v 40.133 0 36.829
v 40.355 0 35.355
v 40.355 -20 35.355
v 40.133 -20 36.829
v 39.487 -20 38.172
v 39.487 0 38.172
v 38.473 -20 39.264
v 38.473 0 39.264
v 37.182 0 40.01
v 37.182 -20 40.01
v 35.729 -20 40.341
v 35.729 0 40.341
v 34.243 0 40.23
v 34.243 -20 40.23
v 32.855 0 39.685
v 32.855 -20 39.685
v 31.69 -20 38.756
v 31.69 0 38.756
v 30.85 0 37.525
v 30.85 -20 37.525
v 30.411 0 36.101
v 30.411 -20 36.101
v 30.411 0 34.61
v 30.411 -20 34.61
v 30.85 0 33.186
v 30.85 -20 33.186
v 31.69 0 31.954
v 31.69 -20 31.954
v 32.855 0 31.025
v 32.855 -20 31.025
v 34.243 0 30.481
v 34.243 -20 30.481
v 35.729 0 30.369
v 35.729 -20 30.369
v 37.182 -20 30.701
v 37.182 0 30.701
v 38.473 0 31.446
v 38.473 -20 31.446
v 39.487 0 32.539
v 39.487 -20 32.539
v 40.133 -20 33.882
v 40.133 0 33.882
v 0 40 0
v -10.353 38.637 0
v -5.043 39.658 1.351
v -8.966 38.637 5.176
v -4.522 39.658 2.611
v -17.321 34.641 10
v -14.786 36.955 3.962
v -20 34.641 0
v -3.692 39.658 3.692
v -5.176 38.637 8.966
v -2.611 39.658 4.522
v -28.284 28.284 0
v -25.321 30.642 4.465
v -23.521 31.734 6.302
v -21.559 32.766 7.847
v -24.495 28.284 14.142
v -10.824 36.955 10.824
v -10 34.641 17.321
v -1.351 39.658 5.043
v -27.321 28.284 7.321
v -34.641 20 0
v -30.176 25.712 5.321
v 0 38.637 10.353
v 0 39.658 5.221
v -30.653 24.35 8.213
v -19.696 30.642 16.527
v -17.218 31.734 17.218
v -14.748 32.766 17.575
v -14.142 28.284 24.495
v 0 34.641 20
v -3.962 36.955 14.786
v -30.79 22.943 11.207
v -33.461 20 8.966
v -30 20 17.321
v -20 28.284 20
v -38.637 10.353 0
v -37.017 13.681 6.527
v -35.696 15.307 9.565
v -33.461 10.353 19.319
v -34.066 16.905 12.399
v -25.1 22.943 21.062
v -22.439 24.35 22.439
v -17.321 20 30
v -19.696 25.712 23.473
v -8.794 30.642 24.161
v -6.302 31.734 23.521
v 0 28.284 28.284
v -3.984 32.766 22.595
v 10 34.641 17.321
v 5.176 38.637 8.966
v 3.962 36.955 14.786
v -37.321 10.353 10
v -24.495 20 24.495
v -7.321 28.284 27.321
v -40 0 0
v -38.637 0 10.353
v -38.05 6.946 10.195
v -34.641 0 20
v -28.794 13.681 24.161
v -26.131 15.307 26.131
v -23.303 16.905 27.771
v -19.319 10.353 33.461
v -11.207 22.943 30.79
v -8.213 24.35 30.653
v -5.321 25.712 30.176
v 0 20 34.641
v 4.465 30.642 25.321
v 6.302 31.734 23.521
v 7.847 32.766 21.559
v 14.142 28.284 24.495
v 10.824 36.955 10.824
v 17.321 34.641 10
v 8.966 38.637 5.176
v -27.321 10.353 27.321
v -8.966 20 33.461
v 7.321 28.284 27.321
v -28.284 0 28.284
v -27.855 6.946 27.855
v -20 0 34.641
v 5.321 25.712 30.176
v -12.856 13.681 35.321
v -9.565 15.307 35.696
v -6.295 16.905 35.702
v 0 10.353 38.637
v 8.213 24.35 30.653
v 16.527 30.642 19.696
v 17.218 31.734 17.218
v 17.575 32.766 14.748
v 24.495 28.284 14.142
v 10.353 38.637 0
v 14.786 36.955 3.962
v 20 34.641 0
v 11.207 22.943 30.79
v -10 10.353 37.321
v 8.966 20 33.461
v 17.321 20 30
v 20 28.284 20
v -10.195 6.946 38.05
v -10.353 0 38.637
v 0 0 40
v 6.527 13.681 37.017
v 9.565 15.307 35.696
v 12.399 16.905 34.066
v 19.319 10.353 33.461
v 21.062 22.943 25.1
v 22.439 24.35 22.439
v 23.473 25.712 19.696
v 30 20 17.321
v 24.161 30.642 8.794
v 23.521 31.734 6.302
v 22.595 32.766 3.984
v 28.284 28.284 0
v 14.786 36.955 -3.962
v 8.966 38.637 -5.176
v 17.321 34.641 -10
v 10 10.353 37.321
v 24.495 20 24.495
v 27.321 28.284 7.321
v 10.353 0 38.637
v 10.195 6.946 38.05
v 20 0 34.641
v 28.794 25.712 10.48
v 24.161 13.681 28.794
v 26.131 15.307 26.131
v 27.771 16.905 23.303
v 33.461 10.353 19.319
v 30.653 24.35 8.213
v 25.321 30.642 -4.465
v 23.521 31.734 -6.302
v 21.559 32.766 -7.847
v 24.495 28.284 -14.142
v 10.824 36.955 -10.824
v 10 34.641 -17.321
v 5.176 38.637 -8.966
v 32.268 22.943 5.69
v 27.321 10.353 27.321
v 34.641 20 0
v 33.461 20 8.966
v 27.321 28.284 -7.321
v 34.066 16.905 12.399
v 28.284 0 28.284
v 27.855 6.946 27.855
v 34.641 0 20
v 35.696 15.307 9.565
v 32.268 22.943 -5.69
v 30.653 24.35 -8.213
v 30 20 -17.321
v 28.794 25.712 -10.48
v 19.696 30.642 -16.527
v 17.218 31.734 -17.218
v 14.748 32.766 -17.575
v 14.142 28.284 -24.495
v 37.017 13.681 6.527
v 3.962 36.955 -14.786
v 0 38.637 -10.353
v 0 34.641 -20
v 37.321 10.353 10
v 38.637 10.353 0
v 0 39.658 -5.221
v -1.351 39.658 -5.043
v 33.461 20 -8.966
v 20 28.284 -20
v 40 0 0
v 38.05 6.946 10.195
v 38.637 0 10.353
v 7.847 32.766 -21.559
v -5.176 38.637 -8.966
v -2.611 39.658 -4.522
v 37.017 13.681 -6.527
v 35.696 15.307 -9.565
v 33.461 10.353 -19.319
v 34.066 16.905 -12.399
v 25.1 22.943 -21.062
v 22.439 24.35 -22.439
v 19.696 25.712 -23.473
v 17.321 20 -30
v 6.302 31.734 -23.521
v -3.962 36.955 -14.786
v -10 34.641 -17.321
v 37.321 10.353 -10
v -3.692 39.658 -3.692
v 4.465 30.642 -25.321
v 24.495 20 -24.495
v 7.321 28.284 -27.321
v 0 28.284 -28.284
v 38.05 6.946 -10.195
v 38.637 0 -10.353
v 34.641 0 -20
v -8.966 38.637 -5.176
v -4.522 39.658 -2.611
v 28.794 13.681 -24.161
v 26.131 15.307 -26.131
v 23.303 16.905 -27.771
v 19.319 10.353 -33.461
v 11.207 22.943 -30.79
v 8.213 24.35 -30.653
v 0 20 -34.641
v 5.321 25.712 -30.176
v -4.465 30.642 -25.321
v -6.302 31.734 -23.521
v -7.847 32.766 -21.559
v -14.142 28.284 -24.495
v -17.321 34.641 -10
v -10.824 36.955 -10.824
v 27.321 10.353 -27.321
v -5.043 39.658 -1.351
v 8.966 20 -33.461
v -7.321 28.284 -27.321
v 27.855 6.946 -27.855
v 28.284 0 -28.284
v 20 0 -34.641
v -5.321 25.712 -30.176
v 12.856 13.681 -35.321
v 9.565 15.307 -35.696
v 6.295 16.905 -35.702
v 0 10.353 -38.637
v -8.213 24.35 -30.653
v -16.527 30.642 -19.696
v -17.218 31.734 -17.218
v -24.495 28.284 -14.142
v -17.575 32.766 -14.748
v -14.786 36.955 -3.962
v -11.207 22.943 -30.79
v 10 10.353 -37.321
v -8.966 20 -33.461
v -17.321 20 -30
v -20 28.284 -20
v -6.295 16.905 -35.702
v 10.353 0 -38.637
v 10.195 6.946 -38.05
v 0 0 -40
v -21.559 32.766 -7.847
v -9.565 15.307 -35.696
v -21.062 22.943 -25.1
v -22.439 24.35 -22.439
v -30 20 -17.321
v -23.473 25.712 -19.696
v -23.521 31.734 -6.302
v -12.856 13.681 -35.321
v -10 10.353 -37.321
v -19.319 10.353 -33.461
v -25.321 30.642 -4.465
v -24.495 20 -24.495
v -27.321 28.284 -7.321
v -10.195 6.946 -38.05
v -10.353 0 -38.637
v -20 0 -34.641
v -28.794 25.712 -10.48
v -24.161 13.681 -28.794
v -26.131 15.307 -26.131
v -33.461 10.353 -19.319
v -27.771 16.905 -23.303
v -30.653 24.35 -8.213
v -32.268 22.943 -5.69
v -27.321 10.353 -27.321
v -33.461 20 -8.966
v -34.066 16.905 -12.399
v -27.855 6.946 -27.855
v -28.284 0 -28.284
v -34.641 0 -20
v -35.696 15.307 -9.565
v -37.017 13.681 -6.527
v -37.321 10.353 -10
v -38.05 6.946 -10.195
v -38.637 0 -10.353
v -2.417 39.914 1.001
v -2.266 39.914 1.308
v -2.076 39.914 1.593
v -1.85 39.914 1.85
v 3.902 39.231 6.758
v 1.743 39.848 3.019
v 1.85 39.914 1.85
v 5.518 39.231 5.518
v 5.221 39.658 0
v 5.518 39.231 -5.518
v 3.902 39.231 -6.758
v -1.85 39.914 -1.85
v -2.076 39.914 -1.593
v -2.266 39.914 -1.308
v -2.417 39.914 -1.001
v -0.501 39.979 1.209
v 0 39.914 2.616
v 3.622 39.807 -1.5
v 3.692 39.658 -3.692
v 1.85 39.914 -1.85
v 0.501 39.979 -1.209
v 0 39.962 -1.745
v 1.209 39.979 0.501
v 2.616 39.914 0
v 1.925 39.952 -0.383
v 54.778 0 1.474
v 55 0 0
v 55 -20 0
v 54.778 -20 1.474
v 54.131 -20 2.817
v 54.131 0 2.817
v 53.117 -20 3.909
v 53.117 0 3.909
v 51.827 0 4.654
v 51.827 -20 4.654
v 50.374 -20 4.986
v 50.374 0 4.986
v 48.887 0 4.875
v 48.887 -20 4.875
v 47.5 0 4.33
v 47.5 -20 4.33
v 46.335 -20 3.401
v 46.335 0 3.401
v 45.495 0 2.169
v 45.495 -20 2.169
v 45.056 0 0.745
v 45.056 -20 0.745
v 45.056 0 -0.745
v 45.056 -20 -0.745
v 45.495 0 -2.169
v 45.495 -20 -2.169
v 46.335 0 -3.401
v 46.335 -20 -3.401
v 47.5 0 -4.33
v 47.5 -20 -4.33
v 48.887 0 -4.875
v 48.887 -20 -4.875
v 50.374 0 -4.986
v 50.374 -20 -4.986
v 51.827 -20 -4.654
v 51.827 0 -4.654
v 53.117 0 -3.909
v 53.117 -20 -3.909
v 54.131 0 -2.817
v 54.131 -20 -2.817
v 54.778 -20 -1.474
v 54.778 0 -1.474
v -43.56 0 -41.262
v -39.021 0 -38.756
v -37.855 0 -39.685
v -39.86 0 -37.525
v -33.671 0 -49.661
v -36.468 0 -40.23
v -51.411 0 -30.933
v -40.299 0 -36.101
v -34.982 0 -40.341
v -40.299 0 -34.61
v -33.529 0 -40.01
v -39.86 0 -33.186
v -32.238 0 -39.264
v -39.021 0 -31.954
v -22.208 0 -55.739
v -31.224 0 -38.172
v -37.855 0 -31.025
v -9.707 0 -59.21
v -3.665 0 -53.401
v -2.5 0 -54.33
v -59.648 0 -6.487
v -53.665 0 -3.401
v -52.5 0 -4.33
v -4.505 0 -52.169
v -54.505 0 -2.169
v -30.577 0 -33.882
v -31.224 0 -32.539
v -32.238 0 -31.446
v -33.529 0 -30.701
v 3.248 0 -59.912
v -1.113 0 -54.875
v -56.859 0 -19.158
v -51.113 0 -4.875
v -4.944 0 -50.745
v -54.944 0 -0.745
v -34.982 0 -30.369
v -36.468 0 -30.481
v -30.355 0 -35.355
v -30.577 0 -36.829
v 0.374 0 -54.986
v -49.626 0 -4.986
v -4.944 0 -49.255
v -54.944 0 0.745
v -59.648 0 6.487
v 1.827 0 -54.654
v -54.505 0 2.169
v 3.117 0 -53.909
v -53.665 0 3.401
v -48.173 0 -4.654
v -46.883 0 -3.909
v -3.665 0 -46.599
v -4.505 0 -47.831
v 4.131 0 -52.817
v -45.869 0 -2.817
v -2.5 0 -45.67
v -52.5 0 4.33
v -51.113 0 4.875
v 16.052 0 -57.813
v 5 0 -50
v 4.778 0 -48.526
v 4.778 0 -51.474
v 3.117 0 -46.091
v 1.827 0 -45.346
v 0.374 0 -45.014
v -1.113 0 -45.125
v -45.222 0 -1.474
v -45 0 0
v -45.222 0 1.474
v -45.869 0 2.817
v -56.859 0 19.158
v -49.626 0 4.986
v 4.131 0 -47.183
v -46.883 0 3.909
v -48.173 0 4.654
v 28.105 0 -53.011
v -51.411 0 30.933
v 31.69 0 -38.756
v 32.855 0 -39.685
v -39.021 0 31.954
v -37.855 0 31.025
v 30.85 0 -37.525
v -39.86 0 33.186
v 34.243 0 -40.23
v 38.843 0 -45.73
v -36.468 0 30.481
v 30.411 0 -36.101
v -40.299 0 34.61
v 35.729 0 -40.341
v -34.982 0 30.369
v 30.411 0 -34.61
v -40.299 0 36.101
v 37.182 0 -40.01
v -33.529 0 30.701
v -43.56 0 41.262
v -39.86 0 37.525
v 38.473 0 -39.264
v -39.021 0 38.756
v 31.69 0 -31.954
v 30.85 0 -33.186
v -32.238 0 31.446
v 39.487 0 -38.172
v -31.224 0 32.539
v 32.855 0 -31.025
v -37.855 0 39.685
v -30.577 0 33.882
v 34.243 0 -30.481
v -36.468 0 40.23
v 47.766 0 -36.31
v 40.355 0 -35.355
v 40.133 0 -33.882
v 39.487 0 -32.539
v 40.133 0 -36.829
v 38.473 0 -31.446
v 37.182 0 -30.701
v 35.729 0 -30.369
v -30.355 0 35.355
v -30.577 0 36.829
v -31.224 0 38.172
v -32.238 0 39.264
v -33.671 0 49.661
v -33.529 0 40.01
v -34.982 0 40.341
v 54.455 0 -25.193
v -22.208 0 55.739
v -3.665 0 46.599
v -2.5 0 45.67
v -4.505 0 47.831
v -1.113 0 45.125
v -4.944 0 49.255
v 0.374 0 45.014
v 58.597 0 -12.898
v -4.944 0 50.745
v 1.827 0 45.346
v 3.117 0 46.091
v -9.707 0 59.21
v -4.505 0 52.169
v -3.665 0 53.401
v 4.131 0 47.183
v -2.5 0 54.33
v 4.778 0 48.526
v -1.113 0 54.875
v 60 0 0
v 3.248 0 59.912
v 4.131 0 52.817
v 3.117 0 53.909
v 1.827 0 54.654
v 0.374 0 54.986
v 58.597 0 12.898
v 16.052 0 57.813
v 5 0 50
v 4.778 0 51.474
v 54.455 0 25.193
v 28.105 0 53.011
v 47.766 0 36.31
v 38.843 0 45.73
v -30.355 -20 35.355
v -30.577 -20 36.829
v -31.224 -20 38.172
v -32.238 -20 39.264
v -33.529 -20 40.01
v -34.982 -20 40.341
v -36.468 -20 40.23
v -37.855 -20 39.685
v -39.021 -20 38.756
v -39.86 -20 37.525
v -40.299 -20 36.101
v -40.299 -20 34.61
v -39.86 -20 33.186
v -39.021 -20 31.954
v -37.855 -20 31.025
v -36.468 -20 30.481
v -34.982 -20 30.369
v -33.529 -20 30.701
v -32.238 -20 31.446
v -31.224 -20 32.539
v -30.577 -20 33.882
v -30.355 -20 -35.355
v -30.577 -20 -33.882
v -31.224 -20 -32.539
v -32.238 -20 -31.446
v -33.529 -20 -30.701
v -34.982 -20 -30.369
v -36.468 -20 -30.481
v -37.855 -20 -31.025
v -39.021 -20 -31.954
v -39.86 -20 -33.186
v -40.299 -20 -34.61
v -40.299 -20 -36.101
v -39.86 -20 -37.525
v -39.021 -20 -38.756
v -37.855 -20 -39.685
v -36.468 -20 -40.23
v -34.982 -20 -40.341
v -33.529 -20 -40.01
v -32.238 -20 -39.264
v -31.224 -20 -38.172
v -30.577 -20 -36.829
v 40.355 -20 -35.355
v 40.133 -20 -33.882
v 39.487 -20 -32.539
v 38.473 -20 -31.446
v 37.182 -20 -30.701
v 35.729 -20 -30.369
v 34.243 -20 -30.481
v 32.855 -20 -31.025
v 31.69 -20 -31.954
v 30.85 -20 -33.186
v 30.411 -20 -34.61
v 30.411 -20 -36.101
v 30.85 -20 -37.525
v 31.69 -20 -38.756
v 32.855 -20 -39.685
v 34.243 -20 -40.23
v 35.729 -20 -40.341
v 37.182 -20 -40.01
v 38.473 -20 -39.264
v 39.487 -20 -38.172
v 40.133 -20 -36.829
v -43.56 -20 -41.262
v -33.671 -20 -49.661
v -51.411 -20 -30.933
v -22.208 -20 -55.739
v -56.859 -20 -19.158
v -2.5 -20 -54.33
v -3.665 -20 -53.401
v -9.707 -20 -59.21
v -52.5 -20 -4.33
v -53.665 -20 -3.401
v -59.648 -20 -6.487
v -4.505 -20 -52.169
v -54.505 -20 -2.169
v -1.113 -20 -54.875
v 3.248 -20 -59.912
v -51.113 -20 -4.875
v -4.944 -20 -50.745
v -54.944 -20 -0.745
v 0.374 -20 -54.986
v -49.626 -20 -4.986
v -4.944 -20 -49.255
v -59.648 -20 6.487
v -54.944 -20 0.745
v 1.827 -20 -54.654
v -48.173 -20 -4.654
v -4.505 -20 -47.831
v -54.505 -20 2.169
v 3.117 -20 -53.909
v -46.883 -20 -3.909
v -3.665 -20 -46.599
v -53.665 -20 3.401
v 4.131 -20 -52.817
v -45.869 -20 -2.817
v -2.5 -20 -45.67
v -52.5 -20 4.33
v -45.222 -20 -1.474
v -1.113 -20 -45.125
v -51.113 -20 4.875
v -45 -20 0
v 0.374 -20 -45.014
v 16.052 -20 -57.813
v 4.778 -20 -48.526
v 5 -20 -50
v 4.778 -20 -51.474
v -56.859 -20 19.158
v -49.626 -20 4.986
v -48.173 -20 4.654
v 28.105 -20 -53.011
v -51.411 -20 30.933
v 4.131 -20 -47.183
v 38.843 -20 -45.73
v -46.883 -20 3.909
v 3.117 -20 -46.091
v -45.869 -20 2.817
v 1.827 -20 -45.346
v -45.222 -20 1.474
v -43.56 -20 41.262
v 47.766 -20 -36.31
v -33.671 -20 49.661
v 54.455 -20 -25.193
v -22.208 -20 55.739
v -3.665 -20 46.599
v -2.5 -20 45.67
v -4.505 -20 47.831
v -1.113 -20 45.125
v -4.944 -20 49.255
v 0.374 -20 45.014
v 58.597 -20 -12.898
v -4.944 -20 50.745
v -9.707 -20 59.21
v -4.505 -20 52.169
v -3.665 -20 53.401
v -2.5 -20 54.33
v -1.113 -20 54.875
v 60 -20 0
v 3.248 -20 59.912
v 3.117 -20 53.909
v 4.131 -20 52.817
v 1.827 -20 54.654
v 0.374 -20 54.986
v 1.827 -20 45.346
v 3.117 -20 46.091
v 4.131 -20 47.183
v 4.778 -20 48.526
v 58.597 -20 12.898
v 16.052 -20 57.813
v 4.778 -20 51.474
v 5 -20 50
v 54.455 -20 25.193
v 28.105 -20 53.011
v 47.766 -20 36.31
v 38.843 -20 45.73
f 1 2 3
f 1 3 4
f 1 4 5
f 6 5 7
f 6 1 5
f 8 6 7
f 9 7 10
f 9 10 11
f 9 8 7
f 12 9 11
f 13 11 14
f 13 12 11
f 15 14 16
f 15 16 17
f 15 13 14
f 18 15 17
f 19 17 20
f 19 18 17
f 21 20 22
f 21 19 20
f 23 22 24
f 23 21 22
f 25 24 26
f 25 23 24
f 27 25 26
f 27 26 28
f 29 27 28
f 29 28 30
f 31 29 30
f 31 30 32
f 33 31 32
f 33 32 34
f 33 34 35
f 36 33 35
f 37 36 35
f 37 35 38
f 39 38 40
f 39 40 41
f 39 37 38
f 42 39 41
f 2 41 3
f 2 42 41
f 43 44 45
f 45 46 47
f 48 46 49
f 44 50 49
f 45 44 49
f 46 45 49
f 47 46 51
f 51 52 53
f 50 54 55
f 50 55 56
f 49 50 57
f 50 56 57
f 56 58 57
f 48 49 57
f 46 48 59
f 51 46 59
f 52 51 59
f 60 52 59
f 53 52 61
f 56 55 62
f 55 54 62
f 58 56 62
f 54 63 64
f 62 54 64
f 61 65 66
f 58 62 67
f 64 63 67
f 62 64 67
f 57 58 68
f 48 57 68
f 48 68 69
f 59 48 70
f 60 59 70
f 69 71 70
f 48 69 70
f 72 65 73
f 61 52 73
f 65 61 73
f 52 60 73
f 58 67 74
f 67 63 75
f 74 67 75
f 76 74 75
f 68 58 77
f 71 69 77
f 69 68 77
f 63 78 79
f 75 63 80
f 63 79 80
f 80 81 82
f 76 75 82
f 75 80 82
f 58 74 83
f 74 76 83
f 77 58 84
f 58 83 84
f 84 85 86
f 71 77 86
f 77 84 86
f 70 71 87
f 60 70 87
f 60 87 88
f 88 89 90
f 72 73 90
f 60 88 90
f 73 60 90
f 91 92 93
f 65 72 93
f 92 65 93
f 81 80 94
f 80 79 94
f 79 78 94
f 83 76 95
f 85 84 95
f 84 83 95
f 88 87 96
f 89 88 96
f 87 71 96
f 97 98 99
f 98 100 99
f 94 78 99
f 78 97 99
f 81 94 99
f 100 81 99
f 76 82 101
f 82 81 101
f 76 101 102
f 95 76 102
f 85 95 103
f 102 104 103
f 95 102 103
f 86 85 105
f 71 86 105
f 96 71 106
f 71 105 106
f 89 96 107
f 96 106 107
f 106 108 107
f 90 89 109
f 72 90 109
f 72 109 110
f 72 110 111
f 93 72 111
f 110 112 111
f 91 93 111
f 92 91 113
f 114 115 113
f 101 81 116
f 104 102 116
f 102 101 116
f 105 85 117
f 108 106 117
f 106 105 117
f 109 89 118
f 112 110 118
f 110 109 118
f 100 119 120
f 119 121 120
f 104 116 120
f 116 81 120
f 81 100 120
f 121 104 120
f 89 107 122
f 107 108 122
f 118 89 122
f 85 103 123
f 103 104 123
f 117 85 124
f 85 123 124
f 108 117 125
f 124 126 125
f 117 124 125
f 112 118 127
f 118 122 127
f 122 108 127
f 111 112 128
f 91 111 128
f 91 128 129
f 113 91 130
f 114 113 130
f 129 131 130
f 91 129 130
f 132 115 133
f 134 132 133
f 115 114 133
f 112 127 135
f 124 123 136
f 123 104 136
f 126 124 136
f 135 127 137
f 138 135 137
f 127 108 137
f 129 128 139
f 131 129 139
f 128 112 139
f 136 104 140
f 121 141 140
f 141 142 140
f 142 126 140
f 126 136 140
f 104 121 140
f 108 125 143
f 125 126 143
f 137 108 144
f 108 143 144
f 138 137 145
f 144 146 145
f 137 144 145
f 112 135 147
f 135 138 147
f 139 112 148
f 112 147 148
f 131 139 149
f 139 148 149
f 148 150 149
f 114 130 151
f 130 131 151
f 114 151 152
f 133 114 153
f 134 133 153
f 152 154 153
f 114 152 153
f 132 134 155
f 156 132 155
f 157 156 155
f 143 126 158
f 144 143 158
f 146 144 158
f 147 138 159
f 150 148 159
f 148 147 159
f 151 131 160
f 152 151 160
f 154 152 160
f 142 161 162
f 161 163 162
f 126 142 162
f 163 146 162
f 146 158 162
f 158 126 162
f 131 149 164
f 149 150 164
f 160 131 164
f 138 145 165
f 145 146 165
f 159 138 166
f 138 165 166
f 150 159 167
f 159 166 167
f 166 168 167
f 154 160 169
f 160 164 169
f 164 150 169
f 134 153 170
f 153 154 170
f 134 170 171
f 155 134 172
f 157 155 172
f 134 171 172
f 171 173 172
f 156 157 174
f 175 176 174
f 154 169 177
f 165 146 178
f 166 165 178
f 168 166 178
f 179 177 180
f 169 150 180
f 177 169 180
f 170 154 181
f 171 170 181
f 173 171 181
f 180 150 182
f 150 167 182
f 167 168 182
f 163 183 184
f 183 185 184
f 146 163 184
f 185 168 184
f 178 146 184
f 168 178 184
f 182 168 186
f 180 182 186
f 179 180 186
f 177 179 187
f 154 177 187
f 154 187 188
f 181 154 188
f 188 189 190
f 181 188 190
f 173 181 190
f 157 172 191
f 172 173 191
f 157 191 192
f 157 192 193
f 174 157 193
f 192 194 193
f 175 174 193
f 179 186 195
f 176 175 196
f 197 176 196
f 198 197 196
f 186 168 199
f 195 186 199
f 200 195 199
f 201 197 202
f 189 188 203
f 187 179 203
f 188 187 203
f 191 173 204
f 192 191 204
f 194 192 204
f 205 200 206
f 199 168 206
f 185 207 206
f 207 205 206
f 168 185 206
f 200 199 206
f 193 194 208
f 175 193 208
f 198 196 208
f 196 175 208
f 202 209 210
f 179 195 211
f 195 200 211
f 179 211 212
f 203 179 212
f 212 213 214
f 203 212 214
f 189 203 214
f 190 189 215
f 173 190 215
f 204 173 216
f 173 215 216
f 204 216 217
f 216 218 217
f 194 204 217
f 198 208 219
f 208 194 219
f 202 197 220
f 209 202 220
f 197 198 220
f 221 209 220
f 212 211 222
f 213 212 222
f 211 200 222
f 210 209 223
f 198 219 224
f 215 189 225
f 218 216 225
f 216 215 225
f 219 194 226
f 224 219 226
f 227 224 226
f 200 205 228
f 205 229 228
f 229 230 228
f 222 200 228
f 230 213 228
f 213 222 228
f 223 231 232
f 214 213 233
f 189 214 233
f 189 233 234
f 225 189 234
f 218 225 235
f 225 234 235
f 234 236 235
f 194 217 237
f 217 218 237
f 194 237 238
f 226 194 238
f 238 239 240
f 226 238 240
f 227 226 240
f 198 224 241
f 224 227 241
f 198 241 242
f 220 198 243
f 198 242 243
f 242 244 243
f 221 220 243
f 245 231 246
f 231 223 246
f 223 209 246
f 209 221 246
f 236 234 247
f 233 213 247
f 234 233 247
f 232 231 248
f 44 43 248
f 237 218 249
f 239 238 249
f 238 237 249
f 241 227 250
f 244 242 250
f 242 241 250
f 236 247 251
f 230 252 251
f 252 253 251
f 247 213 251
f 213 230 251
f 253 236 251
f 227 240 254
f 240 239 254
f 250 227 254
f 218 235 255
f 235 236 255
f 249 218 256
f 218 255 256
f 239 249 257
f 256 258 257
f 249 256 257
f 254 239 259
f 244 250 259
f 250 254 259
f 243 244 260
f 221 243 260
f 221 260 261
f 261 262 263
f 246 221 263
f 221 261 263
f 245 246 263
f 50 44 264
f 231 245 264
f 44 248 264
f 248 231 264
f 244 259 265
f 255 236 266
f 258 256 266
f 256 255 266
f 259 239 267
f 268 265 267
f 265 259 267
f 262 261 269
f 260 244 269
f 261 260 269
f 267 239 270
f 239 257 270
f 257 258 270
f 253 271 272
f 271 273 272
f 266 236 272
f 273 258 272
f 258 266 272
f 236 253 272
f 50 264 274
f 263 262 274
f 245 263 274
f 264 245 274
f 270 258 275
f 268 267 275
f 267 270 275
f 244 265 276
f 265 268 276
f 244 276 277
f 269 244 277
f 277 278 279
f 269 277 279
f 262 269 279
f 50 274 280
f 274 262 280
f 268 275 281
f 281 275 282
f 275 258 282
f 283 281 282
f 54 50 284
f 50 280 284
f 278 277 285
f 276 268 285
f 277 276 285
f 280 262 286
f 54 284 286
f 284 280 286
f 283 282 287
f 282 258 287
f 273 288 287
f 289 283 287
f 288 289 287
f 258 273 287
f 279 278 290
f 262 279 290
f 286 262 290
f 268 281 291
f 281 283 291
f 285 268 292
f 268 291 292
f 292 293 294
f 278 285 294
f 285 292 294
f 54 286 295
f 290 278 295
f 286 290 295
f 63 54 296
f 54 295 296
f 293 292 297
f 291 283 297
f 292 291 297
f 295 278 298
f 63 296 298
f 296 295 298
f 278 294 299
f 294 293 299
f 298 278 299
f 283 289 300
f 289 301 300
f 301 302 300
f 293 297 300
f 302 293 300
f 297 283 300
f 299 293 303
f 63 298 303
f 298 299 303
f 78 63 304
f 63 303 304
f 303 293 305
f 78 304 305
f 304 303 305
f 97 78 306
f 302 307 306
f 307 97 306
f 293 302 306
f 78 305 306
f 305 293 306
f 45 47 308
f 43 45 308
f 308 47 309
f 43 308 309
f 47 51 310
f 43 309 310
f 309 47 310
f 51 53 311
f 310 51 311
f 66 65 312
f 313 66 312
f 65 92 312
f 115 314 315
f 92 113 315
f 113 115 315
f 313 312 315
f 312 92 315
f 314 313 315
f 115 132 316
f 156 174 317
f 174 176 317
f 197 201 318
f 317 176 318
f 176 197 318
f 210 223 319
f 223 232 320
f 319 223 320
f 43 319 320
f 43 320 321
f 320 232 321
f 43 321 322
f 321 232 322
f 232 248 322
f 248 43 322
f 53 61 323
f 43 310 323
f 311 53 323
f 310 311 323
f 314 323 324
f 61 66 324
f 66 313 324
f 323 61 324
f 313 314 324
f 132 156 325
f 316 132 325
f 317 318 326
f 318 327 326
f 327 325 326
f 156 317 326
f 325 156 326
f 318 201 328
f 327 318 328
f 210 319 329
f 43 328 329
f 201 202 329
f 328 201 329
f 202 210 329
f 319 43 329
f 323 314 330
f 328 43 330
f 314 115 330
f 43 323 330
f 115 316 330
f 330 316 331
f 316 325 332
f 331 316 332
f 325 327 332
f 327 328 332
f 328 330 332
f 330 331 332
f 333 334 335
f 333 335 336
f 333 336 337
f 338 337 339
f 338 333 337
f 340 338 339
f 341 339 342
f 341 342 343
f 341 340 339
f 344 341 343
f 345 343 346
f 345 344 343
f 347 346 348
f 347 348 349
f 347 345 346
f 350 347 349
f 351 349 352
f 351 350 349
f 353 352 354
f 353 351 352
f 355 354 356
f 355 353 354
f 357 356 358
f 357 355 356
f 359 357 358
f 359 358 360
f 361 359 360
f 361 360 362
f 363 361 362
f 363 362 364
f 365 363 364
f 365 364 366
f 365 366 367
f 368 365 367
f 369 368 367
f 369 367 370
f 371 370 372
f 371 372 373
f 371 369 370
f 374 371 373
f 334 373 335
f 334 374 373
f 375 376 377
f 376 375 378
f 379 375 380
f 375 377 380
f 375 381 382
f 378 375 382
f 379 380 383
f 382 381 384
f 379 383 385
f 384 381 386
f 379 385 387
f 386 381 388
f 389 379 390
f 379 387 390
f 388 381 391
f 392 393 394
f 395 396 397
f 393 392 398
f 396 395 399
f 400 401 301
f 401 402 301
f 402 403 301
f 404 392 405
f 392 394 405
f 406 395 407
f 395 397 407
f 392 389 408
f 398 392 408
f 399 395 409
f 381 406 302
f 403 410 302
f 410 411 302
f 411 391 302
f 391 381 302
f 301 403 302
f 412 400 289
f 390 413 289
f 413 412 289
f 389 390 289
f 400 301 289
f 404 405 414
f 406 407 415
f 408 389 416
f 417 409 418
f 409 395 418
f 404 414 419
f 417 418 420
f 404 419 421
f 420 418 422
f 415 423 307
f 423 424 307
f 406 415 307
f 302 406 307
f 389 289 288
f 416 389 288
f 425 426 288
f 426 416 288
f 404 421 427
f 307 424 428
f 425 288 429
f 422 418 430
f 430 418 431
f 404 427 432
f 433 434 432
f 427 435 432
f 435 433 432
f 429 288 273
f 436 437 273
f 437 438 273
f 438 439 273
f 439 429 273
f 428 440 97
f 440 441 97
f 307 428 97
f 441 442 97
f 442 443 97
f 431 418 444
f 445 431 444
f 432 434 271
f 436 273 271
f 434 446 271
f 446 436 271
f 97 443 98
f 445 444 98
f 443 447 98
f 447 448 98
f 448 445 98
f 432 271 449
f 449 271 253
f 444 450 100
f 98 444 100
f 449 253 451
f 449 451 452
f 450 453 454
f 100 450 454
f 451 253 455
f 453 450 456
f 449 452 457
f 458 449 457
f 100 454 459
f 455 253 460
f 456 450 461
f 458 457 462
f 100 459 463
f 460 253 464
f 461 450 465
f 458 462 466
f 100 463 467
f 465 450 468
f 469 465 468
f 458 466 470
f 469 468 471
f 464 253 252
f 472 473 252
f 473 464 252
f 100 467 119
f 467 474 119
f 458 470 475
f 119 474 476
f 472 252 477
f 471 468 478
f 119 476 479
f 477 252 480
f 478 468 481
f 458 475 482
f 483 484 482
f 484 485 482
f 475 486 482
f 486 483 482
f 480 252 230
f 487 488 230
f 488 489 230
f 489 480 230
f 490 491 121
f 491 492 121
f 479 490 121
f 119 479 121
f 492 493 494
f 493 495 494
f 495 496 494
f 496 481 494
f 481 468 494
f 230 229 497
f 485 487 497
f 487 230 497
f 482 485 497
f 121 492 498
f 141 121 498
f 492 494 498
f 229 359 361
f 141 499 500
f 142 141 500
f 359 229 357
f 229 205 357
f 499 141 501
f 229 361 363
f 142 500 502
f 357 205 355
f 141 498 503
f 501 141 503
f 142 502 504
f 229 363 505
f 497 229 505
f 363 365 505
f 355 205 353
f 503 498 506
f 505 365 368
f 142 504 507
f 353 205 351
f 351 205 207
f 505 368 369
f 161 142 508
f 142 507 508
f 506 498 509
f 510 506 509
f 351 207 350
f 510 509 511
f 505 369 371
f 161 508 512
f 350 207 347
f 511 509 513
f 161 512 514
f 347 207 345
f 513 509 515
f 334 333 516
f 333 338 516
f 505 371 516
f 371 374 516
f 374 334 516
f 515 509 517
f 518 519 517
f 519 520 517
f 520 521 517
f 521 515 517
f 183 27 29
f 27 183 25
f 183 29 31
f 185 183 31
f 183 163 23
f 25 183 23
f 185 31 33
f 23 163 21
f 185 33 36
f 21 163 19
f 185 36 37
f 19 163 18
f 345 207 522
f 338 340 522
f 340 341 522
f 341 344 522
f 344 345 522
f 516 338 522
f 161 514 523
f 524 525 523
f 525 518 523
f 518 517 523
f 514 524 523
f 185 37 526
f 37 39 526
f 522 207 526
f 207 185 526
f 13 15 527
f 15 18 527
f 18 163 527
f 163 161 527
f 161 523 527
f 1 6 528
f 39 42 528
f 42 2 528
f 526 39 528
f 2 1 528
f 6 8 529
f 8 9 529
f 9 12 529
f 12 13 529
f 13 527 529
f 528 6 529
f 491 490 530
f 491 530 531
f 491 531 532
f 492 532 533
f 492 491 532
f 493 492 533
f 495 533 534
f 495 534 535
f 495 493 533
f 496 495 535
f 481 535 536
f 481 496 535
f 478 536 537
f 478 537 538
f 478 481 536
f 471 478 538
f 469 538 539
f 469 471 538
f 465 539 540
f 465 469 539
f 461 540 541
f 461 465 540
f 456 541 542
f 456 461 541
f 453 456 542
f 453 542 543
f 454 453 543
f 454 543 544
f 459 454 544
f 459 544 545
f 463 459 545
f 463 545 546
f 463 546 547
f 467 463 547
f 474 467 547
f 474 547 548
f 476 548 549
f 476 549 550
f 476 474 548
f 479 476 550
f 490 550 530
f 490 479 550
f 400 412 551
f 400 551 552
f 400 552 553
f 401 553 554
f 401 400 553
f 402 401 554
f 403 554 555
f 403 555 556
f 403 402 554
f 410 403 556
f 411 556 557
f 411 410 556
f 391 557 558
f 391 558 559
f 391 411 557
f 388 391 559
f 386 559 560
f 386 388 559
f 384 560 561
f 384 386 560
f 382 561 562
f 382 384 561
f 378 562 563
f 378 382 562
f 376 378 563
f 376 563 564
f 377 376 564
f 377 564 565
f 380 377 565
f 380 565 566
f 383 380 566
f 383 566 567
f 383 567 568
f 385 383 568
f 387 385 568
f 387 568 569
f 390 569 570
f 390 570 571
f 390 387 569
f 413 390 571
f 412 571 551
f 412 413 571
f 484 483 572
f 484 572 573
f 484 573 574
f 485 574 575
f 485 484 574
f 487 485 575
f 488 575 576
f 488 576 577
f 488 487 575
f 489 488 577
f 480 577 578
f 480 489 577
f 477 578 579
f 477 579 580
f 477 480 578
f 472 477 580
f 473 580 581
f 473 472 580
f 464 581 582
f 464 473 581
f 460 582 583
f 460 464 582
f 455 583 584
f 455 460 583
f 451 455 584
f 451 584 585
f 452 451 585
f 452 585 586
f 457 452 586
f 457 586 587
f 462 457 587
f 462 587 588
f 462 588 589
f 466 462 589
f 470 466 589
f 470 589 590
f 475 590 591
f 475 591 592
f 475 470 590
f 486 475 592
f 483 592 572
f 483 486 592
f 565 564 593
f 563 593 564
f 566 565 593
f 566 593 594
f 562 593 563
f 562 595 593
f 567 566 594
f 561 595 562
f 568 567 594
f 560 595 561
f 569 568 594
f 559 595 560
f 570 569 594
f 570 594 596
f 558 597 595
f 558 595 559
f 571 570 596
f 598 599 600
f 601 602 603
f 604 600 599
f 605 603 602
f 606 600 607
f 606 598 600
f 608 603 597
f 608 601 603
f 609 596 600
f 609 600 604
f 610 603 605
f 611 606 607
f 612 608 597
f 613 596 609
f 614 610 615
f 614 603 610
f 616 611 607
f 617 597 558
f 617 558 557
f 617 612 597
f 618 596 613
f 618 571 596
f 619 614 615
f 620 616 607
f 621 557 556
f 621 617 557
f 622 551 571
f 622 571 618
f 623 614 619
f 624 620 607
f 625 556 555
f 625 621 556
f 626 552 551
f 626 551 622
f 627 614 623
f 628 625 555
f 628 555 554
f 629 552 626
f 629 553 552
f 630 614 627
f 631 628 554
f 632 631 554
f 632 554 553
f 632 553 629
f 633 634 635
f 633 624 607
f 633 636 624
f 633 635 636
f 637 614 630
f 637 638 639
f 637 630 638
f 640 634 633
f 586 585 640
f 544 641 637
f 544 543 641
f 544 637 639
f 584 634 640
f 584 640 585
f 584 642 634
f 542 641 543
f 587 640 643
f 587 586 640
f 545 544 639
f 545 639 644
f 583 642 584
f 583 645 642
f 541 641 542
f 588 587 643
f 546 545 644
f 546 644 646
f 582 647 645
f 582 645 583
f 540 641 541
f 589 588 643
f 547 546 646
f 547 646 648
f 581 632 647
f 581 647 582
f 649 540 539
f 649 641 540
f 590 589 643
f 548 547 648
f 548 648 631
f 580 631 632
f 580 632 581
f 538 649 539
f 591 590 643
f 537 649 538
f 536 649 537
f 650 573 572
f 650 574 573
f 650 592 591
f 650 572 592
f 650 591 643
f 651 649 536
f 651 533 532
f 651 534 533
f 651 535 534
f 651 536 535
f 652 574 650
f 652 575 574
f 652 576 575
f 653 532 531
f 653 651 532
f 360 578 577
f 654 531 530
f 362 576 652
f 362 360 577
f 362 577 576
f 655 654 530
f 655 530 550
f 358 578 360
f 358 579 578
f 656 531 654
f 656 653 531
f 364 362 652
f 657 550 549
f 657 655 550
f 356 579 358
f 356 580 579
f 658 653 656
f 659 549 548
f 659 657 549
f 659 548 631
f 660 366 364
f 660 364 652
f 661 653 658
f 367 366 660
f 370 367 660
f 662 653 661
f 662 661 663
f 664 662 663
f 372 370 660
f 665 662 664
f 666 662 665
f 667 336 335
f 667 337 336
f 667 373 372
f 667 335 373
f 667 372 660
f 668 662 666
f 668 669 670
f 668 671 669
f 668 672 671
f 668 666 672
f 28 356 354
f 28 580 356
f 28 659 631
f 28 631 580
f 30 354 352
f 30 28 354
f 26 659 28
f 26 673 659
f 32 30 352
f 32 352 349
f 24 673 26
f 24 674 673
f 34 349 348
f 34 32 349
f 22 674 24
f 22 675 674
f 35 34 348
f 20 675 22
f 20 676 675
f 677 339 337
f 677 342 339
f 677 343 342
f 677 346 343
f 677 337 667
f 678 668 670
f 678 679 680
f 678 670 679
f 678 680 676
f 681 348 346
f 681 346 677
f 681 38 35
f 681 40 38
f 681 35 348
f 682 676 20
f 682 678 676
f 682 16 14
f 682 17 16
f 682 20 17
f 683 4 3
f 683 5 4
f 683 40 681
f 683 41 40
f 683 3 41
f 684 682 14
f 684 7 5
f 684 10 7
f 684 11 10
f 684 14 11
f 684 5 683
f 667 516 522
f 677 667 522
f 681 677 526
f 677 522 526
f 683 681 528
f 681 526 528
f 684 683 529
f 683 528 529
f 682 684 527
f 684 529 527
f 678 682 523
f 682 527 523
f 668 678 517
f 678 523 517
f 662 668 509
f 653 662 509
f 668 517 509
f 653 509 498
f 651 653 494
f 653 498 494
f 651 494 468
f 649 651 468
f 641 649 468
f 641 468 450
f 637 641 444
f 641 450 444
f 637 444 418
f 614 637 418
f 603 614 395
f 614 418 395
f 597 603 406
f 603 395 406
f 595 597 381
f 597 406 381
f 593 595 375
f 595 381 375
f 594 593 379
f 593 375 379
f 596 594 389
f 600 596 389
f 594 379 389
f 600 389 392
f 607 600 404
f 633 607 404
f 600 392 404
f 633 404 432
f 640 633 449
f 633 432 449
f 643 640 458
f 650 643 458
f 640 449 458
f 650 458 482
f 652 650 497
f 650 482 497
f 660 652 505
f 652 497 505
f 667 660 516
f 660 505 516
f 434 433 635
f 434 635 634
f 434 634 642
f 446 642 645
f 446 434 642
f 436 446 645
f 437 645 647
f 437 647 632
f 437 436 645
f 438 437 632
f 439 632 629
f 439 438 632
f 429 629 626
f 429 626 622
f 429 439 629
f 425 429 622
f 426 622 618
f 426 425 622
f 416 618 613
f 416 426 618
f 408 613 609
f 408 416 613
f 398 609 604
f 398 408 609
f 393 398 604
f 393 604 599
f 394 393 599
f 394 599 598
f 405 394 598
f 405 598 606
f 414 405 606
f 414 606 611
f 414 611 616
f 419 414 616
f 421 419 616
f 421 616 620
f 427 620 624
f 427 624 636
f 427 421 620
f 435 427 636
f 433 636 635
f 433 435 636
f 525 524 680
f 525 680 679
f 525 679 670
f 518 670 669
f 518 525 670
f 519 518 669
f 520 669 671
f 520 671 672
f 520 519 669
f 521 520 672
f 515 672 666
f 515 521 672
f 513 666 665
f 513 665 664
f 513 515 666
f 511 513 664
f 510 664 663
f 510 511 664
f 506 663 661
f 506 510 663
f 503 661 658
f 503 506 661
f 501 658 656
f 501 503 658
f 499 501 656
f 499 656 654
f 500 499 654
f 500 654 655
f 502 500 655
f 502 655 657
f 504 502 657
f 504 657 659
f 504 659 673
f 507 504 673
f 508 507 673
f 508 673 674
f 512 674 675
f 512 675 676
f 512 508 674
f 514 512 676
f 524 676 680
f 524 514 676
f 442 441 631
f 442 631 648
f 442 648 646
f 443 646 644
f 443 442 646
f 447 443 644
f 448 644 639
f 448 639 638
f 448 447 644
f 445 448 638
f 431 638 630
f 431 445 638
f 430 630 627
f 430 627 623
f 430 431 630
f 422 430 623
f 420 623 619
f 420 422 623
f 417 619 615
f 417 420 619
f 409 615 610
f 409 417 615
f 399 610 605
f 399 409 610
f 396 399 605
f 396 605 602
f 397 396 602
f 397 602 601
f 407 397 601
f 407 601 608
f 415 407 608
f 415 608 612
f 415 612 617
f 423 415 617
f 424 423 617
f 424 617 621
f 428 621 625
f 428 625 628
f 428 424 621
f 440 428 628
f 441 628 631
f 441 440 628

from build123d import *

# Parameters (mm, degrees)
F0_R     = 60
F0_R_2   = 5
F1_DEPTH = 20


with BuildPart() as f1:
    # F0 (on Front) → F1 (new body)
    with BuildSketch(Plane.XZ):
        Circle(F0_R)
        with Locations((-35.355339, -35.355339)):
            Circle(F0_R_2, mode=Mode.SUBTRACT)
        with Locations((0, -50)):
            Circle(F0_R_2, mode=Mode.SUBTRACT)
        with Locations((35.355339, -35.355339)):
            Circle(F0_R_2, mode=Mode.SUBTRACT)
        with Locations((-50, 0)):
            Circle(F0_R_2, mode=Mode.SUBTRACT)
        with Locations((-35.355339, 35.355339)):
            Circle(F0_R_2, mode=Mode.SUBTRACT)
        with Locations((50, 0)):
            Circle(F0_R_2, mode=Mode.SUBTRACT)
        with Locations((0, 50)):
            Circle(F0_R_2, mode=Mode.SUBTRACT)
        with Locations((35.355339, 35.355339)):
            Circle(F0_R_2, mode=Mode.SUBTRACT)
    extrude(amount=F1_DEPTH)

    # F2 (on Top) → F3 (revolve)
    with BuildSketch(Plane.XY):
        with BuildLine():
            Line((-40, 0), (0, 0))
            Line((0, 0), (0, 40))
            ThreePointArc((0, 40), (-28.284271, 28.284271), (-40, 0))
        make_face()
    revolve(axis=Axis((0, 20, 0), (0, 1, 0)))


solid = f1.part
